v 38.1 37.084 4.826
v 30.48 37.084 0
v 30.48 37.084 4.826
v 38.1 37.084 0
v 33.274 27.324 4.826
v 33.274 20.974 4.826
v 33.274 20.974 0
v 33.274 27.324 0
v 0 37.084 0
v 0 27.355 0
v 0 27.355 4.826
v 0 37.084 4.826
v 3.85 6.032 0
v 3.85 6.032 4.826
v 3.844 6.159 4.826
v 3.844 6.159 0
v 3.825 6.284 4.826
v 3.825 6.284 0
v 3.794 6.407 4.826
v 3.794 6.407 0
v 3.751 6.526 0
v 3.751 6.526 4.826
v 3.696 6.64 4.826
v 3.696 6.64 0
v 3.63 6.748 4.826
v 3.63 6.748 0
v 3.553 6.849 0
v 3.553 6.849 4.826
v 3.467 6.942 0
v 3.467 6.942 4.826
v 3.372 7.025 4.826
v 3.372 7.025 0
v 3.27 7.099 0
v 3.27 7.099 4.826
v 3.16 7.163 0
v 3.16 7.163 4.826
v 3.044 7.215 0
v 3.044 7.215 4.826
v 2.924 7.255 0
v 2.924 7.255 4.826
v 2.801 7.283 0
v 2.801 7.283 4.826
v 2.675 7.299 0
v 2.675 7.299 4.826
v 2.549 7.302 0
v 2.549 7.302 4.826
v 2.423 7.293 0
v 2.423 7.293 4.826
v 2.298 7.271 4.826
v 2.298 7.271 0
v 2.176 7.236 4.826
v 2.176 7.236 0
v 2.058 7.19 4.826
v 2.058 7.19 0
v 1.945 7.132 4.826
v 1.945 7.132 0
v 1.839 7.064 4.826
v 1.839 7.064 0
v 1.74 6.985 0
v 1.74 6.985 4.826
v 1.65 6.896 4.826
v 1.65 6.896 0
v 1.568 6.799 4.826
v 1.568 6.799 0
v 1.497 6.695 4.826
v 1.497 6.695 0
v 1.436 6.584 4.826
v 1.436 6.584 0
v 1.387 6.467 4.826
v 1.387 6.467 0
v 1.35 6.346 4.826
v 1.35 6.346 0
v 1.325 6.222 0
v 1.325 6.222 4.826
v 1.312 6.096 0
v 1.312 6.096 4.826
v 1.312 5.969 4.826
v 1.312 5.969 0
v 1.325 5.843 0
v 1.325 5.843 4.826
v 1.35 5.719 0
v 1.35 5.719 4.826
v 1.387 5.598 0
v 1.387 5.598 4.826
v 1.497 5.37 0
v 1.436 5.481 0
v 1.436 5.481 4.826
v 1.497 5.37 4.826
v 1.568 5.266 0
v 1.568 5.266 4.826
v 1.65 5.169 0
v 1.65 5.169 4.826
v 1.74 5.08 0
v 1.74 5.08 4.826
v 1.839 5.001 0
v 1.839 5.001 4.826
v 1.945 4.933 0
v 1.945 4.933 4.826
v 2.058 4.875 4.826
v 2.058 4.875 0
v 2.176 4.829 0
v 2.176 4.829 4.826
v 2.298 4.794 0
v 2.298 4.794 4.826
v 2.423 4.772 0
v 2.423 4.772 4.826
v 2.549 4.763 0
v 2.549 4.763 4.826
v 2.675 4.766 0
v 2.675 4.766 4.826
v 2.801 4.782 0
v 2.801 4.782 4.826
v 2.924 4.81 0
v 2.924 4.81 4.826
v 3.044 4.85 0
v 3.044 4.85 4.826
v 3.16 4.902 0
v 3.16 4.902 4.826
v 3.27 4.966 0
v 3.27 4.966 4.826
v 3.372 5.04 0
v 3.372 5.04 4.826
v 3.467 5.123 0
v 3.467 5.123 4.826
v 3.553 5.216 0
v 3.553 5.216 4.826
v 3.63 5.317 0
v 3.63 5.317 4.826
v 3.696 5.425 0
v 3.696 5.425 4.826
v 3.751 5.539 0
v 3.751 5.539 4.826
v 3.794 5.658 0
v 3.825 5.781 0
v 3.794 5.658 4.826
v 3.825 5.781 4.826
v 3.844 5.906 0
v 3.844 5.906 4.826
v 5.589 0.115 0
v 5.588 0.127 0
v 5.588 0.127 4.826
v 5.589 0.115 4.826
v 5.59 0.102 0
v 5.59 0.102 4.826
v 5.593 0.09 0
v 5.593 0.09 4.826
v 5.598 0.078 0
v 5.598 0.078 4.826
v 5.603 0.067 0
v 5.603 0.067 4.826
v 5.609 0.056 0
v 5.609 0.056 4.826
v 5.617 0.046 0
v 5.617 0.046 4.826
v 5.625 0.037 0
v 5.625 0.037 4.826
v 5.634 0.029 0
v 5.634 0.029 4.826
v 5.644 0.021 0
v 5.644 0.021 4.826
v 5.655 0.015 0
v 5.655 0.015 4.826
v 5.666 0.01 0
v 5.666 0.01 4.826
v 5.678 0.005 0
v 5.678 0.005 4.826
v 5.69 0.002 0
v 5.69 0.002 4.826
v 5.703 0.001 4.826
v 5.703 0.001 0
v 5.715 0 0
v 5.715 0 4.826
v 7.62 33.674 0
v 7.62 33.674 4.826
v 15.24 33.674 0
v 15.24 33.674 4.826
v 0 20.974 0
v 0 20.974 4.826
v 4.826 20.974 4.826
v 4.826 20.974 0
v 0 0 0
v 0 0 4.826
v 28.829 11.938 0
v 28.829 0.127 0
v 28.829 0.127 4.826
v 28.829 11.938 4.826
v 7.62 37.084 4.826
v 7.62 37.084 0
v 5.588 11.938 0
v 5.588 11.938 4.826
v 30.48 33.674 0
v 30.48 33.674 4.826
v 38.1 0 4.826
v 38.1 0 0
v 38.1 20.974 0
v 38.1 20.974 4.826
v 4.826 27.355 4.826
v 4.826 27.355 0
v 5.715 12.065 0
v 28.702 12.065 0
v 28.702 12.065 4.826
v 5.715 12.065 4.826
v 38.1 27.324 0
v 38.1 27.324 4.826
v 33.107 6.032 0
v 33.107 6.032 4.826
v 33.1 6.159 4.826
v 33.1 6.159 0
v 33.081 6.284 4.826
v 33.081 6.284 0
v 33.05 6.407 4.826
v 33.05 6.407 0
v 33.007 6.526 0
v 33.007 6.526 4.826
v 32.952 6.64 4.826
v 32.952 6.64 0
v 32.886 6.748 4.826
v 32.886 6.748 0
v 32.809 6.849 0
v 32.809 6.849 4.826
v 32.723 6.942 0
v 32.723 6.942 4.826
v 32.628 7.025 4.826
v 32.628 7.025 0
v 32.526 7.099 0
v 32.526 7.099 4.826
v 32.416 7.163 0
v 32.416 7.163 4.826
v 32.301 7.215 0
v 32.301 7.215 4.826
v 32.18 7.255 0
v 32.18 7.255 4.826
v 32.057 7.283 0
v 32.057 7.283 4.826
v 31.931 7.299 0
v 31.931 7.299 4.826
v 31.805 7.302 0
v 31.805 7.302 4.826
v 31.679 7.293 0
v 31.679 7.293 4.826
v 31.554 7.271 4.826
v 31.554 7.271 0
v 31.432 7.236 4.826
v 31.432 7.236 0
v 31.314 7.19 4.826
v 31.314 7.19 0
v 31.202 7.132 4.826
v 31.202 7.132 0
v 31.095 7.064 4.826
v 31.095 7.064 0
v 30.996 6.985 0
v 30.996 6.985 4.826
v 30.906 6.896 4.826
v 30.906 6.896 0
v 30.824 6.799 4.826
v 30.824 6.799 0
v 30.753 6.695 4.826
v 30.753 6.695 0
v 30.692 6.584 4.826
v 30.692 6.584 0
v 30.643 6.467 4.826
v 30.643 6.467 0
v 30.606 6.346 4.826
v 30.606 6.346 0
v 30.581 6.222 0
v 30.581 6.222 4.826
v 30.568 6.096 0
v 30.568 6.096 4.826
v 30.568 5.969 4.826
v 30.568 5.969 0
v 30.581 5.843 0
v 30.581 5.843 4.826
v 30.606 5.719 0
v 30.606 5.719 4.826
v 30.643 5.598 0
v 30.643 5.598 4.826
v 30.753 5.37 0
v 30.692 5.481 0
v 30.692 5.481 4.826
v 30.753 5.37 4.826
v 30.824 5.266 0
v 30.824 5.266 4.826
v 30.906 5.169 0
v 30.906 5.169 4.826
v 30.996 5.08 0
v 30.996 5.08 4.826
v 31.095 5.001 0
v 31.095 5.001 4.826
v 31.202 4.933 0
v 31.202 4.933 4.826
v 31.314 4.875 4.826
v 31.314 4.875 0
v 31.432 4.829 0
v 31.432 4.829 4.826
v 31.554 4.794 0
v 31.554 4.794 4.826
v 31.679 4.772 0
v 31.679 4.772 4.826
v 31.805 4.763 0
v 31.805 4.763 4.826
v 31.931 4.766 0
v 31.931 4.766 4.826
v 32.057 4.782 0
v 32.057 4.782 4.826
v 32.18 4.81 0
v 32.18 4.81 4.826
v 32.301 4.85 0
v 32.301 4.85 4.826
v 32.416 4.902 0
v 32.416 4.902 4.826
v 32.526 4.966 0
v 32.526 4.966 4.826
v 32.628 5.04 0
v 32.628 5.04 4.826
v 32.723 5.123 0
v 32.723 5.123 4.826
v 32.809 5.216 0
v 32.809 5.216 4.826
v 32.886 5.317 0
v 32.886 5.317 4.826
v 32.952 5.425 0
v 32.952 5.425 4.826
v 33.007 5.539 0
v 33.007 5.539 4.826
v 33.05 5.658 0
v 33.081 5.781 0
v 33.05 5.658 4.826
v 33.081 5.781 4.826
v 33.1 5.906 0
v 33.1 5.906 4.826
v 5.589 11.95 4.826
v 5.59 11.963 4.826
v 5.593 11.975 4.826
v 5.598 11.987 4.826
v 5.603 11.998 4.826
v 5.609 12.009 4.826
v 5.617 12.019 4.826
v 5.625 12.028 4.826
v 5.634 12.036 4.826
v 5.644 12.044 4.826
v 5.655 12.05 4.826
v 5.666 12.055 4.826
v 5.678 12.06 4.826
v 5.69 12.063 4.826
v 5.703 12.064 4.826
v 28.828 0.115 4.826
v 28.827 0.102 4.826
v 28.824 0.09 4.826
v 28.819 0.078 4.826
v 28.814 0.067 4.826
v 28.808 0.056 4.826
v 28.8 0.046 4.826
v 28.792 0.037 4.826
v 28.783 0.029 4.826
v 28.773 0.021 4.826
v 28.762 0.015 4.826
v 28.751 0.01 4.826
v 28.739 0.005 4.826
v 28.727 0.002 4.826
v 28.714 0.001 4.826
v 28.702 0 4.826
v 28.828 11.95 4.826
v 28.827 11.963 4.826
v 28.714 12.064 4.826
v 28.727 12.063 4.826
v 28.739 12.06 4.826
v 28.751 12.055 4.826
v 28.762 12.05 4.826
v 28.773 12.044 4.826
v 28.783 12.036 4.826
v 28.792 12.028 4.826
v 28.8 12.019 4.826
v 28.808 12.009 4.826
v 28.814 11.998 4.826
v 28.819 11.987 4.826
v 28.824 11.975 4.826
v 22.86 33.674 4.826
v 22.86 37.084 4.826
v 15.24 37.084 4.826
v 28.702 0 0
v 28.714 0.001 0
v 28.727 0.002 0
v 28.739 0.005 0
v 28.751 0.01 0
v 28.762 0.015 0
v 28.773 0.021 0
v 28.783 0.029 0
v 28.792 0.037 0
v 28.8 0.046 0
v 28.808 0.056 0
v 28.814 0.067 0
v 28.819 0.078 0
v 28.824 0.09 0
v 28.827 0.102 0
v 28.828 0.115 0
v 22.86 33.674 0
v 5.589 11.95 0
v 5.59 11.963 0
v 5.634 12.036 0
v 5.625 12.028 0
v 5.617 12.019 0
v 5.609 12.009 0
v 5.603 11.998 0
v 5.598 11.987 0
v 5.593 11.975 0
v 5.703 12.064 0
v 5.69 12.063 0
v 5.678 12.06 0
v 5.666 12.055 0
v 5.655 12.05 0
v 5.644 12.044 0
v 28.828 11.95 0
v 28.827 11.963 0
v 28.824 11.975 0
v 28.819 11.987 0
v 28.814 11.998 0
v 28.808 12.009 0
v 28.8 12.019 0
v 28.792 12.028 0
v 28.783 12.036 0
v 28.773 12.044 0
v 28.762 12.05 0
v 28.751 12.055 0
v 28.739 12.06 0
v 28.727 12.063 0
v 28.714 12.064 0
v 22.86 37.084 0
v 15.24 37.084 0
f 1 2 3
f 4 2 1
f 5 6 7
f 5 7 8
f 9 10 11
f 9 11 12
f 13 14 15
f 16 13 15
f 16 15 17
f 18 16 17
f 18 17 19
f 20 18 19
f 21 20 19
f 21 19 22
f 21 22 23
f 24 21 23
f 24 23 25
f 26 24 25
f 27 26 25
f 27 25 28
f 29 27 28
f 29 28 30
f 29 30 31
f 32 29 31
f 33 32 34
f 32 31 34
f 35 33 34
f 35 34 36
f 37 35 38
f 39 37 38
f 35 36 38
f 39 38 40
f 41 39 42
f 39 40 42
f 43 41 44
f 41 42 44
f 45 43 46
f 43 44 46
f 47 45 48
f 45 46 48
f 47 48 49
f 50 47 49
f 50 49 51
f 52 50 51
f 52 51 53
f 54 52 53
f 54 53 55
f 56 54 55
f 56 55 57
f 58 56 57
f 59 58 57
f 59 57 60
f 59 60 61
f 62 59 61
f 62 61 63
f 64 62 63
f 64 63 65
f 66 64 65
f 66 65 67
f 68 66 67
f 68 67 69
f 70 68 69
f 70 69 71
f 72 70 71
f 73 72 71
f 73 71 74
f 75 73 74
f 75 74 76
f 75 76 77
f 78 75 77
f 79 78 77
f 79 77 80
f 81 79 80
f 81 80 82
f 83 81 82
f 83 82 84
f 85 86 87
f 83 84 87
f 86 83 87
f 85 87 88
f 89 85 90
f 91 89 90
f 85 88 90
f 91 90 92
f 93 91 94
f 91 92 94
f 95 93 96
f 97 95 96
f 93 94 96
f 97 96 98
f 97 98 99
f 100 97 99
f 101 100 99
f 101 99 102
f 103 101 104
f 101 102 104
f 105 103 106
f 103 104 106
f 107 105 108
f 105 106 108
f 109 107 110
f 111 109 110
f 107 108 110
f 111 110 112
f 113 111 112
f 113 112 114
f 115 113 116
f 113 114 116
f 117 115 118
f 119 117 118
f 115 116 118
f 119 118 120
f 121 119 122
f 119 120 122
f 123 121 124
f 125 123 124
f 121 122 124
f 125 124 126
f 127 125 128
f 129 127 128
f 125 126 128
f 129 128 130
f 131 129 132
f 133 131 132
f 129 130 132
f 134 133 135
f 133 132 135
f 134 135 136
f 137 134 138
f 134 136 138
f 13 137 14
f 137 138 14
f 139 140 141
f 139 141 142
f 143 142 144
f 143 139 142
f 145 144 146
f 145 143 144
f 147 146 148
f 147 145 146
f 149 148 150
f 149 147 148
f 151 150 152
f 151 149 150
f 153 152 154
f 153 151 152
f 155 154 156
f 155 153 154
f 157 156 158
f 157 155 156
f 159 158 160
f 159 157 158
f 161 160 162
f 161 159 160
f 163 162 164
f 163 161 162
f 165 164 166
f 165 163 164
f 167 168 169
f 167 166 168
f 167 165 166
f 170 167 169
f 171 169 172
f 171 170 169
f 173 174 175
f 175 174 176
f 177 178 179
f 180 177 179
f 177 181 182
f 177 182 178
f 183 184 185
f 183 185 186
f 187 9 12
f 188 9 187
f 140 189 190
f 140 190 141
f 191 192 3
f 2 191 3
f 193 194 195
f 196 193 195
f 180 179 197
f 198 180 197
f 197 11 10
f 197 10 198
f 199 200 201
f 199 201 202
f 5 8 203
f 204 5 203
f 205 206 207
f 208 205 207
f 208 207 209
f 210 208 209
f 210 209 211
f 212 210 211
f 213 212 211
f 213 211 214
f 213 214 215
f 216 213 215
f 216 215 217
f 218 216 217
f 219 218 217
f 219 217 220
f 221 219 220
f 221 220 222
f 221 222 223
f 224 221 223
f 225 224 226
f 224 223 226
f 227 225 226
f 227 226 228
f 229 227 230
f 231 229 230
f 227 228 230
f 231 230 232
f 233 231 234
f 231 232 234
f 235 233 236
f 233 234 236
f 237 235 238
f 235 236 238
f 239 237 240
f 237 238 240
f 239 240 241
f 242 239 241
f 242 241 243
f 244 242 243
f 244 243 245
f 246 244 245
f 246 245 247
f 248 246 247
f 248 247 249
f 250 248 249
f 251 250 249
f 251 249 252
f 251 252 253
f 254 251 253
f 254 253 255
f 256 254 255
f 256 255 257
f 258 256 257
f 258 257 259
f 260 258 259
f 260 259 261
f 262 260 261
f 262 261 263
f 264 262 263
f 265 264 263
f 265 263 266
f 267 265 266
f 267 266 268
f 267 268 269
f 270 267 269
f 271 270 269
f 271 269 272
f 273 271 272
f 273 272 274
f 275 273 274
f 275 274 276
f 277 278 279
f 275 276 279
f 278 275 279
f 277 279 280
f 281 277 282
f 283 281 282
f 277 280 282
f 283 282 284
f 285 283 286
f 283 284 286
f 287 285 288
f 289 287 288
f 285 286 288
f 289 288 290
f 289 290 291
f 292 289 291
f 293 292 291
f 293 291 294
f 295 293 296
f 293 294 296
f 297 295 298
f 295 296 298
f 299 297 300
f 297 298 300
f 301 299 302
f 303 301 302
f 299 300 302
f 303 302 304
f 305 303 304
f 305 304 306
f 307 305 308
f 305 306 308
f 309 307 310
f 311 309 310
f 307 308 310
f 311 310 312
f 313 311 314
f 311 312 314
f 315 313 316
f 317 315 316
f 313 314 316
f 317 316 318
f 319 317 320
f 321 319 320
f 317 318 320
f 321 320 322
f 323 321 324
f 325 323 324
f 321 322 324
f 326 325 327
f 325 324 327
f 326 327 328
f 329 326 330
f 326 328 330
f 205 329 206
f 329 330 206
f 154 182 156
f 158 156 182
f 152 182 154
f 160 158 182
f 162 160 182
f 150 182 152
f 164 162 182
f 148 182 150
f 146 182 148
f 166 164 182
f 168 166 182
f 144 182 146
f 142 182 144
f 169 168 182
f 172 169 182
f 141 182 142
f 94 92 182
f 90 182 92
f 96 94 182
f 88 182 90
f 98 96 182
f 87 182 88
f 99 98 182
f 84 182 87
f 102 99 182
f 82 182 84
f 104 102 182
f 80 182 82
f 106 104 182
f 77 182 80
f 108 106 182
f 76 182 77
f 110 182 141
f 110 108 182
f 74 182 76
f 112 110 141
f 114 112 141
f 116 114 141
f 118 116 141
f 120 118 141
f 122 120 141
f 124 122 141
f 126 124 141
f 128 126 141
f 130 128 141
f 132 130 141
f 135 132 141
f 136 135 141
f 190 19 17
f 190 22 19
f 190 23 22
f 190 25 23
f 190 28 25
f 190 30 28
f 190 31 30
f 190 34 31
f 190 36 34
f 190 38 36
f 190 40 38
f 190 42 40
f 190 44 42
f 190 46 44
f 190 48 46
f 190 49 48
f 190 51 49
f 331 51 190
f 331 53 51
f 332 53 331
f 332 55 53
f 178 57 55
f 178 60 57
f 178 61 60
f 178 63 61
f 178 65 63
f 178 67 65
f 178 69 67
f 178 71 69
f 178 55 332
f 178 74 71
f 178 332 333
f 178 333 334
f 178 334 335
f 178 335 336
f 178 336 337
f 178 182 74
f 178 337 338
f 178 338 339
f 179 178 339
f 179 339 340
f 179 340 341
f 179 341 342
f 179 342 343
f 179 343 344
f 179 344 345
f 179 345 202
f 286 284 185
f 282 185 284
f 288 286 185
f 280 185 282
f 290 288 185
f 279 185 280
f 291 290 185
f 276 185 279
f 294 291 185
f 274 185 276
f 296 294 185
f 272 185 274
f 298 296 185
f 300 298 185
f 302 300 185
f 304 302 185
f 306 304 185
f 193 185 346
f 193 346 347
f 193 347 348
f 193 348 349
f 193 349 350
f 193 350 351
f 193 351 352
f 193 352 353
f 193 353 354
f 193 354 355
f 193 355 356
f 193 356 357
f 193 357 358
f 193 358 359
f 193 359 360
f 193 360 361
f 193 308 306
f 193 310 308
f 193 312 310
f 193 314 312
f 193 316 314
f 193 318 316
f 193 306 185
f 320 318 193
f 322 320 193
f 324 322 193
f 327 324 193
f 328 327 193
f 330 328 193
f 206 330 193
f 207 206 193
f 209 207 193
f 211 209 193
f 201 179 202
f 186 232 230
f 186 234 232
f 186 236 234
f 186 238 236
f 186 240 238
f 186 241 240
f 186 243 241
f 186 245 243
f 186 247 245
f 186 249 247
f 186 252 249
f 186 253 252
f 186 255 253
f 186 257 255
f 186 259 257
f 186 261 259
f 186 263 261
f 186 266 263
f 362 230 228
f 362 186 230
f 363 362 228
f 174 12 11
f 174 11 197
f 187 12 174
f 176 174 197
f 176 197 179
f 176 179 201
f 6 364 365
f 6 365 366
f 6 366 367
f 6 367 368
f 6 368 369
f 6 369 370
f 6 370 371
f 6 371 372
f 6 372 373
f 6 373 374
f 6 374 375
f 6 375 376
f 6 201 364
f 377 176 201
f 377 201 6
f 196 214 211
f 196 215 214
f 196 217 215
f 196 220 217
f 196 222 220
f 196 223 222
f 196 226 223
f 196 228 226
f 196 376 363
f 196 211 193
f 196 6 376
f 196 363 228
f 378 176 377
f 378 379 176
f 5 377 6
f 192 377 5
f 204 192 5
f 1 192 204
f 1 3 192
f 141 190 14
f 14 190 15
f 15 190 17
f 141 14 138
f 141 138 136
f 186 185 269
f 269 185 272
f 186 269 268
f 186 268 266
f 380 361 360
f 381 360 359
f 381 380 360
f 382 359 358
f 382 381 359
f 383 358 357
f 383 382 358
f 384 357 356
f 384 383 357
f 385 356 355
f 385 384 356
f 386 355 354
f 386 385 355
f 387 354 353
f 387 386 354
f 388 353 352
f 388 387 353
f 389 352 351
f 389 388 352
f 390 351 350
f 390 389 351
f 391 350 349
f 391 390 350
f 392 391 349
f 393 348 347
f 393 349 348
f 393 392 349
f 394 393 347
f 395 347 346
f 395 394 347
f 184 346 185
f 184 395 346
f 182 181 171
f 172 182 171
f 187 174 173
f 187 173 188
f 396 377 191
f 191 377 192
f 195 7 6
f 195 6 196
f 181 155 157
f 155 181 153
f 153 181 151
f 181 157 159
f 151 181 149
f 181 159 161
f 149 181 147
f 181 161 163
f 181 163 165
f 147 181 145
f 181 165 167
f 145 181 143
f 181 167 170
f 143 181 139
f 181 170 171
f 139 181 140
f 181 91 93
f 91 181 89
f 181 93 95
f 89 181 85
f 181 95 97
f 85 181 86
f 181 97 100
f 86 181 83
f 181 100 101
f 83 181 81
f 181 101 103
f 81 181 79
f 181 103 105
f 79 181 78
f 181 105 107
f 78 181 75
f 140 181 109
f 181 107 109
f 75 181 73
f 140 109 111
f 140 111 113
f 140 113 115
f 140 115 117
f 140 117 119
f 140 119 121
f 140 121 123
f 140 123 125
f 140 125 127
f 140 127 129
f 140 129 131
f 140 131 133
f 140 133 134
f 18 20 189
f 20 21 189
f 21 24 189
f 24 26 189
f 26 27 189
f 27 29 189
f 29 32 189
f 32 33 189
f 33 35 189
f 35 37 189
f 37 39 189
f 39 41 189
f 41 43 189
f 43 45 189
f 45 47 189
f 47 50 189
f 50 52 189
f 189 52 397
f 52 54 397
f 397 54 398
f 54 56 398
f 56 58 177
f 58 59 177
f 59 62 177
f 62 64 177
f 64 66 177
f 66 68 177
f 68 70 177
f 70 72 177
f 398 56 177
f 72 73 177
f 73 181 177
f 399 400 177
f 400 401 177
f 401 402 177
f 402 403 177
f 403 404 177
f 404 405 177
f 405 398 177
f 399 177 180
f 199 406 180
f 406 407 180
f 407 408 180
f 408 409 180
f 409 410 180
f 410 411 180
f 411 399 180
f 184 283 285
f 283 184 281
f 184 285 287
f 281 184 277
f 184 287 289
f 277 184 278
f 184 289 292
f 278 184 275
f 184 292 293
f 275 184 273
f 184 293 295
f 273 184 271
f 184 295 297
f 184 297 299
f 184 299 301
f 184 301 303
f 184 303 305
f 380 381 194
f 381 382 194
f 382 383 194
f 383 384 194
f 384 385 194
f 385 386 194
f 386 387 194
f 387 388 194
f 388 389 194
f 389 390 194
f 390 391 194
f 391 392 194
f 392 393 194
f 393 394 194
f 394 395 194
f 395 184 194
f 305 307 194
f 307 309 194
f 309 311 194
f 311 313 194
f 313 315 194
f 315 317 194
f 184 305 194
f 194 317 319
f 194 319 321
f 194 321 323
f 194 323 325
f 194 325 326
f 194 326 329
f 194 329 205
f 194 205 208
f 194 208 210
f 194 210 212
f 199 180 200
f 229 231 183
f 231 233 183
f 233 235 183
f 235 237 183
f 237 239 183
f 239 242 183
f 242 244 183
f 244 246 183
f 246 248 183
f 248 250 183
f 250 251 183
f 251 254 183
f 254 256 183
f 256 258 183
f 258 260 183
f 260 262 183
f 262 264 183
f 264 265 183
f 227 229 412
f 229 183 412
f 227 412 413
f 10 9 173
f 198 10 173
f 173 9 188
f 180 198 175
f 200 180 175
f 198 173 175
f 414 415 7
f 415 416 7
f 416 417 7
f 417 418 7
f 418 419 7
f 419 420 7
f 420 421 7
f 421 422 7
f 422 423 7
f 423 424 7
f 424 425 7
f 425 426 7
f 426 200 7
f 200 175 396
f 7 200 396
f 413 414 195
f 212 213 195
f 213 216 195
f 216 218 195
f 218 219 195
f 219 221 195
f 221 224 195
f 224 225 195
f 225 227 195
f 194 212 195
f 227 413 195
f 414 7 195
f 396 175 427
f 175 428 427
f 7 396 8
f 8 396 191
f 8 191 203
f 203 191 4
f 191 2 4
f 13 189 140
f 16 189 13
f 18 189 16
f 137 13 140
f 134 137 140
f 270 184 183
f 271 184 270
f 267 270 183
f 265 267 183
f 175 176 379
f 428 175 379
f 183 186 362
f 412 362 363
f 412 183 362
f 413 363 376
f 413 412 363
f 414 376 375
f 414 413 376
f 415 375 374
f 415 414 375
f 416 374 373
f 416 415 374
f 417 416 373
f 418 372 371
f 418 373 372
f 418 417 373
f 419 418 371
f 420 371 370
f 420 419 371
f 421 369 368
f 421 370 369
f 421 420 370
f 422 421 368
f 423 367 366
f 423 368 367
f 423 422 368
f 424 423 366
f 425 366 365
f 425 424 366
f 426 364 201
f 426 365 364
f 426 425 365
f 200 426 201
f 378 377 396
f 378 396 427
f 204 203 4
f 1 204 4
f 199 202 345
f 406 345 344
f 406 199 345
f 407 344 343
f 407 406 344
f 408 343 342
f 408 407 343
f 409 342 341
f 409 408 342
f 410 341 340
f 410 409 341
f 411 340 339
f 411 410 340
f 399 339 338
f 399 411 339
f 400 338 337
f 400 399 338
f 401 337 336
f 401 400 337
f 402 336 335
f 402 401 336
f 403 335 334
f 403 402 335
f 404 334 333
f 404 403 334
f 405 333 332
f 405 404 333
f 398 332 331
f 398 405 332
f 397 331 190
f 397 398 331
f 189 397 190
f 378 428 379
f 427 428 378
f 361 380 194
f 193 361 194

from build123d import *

# Parameters (mm, degrees)
SKETCH1_W           = 38.1
SKETCH1_H           = 37.084
BOSS_EXTRUDE1_DEPTH = 4.826
SKETCH3_R           = 1.27
CUT_EXTRUDE2_DEPTH  = 54.386546358
CUT_EXTRUDE3_DEPTH  = 54.386546358
SKETCH5_W           = 7.62
SKETCH5_H           = 3.409901171
CUT_EXTRUDE4_DEPTH  = 54.386546358
SKETCH7_W           = 4.826
SKETCH7_H           = 6.380433542
SKETCH7_H_2         = 6.35
CUT_EXTRUDE5_DEPTH  = 54.386546358


with BuildPart() as part:
    # Sketch1 → Boss-Extrude1 (new body)
    with BuildSketch(Plane.XY):
        with Locations((19.05, 18.542)):
            Rectangle(SKETCH1_W, SKETCH1_H)
    extrude(amount=BOSS_EXTRUDE1_DEPTH)

    # Sketch3 → Cut-Extrude2 (cut, through all)
    with BuildSketch(Plane.XY.offset(4.826)):
        with Locations((2.580480538, 6.0325)):
            Circle(SKETCH3_R)
        with Locations((31.836519462, 6.0325)):
            Circle(SKETCH3_R)
    extrude(amount=-CUT_EXTRUDE2_DEPTH, mode=Mode.SUBTRACT)

    # Sketch4 → Cut-Extrude3 (cut, through all)
    with BuildSketch(Plane(origin=(0, 0, 0), x_dir=(-1, 0, 0), z_dir=(0, 0, -1))):
        with BuildLine():
            Line((-28.702, 12.065), (-5.715, 12.065))
            ThreePointArc((-5.715, 12.065), (-5.625197439, 12.027802561), (-5.588, 11.938))
            Line((-5.588, 11.938), (-5.588, 0.127))
            ThreePointArc((-5.588, 0.127), (-5.625197439, 0.037197439), (-5.715, 0))
            Line((-5.715, 0), (-28.702, 0))
            ThreePointArc((-28.702, 0), (-28.791802561, 0.037197439), (-28.829, 0.127))
            Line((-28.829, 0.127), (-28.829, 11.938))
            ThreePointArc((-28.829, 11.938), (-28.791802561, 12.027802561), (-28.702, 12.065))
        make_face()
    extrude(amount=-CUT_EXTRUDE3_DEPTH, mode=Mode.SUBTRACT)

    # Sketch5 → Cut-Extrude4 (cut, through all)
    with BuildSketch(Plane.XY.offset(4.826)):
        with Locations((11.43, 35.379049415)):
            Rectangle(SKETCH5_W, SKETCH5_H)
        with Locations((26.67, 35.379049415)):
            Rectangle(SKETCH5_W, SKETCH5_H)
    extrude(amount=-CUT_EXTRUDE4_DEPTH, mode=Mode.SUBTRACT)

    # Sketch7 → Cut-Extrude5 (cut, through all)
    with BuildSketch(Plane.XY.offset(4.826)):
        with Locations((2.413, 24.1643156)):
            Rectangle(SKETCH7_W, SKETCH7_H)
        with Locations((35.687, 24.149098829)):
            Rectangle(SKETCH7_W, SKETCH7_H_2)
    extrude(amount=-CUT_EXTRUDE5_DEPTH, mode=Mode.SUBTRACT)


solid = part.part
